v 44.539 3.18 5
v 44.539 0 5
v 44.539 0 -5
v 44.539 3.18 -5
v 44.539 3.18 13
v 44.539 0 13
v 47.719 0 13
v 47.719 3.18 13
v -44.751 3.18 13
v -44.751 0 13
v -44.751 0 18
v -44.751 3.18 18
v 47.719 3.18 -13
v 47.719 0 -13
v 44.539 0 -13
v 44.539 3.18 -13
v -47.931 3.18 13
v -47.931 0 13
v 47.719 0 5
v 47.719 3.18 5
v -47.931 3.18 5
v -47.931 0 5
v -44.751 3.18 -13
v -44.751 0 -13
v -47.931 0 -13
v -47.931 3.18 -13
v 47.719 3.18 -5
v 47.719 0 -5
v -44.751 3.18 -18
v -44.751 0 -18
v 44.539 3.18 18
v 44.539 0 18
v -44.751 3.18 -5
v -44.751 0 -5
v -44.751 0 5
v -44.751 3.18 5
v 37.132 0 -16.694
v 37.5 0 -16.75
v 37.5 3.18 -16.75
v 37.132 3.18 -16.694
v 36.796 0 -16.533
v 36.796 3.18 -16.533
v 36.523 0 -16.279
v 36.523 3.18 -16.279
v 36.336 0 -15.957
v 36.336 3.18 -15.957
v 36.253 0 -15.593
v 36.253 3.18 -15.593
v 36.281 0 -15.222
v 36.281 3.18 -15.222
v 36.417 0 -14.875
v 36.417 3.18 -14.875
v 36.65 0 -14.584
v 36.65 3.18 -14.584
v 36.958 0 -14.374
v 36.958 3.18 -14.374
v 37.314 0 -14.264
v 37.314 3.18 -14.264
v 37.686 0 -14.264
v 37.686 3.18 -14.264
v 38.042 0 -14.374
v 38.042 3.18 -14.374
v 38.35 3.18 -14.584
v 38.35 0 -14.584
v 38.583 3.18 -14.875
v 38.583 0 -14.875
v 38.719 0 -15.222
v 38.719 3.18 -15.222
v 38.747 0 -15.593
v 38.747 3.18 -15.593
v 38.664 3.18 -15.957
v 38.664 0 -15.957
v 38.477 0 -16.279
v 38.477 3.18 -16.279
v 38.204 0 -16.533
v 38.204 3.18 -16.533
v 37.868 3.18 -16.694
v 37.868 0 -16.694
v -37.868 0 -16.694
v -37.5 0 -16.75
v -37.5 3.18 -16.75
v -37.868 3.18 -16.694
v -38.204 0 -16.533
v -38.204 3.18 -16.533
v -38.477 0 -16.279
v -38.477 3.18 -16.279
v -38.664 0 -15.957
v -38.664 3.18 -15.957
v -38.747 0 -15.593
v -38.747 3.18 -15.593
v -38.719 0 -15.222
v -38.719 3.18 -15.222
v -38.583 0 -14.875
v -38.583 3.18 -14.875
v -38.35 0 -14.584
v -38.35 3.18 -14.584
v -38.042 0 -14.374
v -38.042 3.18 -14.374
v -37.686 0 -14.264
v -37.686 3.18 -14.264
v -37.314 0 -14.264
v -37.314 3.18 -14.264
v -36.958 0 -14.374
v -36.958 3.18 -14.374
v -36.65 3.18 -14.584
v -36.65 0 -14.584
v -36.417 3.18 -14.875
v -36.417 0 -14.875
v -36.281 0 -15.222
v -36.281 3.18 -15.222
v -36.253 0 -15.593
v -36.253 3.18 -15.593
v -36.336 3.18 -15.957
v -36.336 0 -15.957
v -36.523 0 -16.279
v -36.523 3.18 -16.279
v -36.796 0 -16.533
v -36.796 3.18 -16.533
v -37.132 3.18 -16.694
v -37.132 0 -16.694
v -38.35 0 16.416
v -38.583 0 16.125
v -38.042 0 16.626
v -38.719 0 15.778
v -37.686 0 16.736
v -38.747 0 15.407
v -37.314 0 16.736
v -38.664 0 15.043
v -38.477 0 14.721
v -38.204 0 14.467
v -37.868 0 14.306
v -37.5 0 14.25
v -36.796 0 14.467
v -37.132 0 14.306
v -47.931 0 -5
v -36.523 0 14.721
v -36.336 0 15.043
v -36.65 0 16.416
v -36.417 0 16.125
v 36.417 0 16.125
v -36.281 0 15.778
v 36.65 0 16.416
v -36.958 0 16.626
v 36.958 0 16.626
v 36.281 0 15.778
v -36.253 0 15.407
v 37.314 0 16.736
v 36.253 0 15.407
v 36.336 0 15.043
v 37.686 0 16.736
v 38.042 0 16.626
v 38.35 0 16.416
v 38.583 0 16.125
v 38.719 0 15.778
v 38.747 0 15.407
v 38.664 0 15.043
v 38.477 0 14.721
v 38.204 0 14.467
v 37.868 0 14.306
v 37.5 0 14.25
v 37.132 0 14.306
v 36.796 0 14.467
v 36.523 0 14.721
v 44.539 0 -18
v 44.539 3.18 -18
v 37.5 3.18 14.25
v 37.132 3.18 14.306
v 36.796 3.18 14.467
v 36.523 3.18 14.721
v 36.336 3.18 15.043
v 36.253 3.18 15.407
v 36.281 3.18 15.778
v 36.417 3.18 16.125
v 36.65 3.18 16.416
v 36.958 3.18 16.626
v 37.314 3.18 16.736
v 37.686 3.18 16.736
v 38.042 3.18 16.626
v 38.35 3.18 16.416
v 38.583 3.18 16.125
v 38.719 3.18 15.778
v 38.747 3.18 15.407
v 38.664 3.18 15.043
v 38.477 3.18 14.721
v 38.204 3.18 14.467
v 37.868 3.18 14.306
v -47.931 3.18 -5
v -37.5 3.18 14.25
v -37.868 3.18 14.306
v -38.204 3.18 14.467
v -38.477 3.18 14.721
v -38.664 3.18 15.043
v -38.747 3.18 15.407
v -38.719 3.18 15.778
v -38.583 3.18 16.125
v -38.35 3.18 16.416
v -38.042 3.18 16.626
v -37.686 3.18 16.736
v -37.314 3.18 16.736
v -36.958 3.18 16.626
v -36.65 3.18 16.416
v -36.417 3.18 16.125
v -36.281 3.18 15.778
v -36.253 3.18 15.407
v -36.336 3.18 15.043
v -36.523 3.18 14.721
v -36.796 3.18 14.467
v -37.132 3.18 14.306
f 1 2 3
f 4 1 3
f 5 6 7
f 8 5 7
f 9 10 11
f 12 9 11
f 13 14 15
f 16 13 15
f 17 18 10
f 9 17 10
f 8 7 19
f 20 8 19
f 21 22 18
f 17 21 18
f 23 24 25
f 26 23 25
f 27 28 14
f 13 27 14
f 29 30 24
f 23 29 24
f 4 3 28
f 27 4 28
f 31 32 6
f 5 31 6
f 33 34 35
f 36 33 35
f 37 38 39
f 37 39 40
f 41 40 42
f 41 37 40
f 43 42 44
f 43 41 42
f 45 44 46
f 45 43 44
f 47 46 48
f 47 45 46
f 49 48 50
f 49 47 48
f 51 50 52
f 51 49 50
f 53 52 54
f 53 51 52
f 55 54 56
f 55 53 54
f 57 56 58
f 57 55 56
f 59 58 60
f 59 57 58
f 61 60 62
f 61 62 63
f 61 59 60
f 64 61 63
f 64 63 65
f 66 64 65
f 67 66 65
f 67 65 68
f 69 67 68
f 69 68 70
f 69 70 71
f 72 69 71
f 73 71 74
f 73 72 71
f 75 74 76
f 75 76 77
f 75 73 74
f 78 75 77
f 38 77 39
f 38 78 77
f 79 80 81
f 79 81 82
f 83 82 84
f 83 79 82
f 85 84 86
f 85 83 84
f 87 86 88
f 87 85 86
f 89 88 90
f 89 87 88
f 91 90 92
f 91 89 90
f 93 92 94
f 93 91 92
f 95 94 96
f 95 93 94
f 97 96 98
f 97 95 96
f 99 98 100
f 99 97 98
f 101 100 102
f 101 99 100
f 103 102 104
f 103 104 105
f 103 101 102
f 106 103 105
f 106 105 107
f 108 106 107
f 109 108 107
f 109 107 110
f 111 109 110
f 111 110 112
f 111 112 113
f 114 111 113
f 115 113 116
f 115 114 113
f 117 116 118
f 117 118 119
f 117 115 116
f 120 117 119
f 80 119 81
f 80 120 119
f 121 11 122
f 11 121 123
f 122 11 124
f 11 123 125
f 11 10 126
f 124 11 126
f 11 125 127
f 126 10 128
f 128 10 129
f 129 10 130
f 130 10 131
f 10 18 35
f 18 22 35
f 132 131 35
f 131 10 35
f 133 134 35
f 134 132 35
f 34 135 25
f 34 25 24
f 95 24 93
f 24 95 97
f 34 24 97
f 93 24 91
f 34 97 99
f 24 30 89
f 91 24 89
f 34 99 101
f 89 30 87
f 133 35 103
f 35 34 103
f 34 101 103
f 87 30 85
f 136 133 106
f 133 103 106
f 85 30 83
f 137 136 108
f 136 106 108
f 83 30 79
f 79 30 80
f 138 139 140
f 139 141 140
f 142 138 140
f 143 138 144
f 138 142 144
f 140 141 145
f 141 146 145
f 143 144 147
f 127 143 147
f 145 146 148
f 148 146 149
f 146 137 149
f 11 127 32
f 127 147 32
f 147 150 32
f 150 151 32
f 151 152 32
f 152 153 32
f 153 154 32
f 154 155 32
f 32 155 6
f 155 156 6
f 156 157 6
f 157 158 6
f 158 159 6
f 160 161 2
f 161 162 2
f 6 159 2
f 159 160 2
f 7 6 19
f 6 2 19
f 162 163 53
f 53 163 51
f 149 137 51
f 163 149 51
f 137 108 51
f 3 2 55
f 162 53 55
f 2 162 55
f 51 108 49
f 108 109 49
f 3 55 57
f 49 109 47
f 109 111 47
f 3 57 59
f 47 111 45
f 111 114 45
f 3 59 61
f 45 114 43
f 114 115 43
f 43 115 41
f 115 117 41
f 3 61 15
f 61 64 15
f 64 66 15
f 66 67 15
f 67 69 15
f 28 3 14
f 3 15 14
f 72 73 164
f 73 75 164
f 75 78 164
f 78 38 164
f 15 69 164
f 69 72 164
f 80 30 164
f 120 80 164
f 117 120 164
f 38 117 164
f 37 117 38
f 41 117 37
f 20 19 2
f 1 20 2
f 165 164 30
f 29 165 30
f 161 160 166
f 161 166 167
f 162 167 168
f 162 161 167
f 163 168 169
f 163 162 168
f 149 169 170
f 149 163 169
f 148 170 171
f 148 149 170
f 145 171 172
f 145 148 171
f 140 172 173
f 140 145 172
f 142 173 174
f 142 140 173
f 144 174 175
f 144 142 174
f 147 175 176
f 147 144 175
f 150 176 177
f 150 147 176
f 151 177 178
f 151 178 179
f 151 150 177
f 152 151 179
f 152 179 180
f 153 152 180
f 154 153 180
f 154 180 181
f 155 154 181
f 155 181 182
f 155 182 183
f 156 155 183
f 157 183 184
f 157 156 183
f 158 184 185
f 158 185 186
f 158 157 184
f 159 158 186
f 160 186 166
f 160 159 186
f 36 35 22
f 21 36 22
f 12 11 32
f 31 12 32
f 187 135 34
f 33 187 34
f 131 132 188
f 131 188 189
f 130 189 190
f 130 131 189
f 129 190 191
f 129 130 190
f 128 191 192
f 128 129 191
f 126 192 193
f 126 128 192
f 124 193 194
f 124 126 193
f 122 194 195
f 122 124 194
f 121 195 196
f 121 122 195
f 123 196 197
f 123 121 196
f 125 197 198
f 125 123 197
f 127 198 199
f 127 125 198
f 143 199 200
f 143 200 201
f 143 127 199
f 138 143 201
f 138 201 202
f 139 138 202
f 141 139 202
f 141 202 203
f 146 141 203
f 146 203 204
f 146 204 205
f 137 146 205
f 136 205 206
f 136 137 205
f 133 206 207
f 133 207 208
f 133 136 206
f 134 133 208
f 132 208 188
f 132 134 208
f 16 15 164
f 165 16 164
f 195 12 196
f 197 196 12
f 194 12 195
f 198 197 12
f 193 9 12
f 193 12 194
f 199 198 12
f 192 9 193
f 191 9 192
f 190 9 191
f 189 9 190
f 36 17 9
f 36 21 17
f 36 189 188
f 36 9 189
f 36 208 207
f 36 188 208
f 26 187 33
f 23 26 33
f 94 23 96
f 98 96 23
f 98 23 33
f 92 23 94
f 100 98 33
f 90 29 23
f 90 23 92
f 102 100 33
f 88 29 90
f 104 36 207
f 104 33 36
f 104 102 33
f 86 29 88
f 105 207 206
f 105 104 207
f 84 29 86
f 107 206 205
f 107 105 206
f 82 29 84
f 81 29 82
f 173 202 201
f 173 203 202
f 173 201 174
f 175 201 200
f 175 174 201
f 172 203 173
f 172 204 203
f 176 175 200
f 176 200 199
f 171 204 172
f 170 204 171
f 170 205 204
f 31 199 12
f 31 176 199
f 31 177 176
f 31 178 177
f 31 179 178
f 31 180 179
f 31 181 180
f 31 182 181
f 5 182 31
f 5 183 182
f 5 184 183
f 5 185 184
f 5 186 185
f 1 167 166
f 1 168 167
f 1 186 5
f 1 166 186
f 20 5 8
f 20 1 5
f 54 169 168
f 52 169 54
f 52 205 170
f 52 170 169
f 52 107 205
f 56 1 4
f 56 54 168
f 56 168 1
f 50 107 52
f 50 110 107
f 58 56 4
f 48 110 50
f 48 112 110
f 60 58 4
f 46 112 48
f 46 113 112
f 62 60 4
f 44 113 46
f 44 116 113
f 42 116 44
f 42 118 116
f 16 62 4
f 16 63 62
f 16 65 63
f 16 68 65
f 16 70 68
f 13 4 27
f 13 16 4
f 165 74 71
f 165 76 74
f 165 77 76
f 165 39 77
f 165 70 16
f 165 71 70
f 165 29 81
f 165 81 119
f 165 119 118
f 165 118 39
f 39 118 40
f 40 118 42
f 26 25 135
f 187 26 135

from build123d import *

# Parameters (mm, degrees)
SKETCH1_R           = 1.25
BOSS_EXTRUDE1_DEPTH = 3.18


with BuildPart() as part:
    # Sketch1 → Boss-Extrude1 (new body)
    with BuildSketch(Plane(origin=(0, 0, 0), x_dir=(1, 0, 0), z_dir=(0, 1, 0))):
        Polygon((-47.930848892, -13), (-44.750848892, -13), (-44.750848892, -18), (-40, -18), (-37.5, -18), (37.5, -18), (40, -18), (44.539151108, -18), (44.539151108, -13), (47.719151108, -13), (47.719151108, -5), (44.539151108, -5), (44.539151108, 5), (47.719151108, 5), (47.719151108, 13), (44.539151108, 13), (44.539151108, 18), (40, 18), (37.5, 18), (-37.5, 18), (-40, 18), (-44.750848892, 18), (-44.750848892, 13), (-47.930848892, 13), (-47.930848892, 5), (-44.750848892, 5), (-44.750848892, -5), (-47.930848892, -5), align=None)
        with Locations(Location((37.5, 15.5, 0), (0, 0, 90))):
            Circle(SKETCH1_R, mode=Mode.SUBTRACT)
        with Locations(Location((37.5, -15.5, 0), (0, 0, 90))):
            Circle(SKETCH1_R, mode=Mode.SUBTRACT)
        with Locations(Location((-37.5, -15.5, 0), (0, 0, 90))):
            Circle(SKETCH1_R, mode=Mode.SUBTRACT)
        with Locations(Location((-37.5, 15.5, 0), (0, 0, 90))):
            Circle(SKETCH1_R, mode=Mode.SUBTRACT)
    extrude(amount=BOSS_EXTRUDE1_DEPTH)


solid = part.part
